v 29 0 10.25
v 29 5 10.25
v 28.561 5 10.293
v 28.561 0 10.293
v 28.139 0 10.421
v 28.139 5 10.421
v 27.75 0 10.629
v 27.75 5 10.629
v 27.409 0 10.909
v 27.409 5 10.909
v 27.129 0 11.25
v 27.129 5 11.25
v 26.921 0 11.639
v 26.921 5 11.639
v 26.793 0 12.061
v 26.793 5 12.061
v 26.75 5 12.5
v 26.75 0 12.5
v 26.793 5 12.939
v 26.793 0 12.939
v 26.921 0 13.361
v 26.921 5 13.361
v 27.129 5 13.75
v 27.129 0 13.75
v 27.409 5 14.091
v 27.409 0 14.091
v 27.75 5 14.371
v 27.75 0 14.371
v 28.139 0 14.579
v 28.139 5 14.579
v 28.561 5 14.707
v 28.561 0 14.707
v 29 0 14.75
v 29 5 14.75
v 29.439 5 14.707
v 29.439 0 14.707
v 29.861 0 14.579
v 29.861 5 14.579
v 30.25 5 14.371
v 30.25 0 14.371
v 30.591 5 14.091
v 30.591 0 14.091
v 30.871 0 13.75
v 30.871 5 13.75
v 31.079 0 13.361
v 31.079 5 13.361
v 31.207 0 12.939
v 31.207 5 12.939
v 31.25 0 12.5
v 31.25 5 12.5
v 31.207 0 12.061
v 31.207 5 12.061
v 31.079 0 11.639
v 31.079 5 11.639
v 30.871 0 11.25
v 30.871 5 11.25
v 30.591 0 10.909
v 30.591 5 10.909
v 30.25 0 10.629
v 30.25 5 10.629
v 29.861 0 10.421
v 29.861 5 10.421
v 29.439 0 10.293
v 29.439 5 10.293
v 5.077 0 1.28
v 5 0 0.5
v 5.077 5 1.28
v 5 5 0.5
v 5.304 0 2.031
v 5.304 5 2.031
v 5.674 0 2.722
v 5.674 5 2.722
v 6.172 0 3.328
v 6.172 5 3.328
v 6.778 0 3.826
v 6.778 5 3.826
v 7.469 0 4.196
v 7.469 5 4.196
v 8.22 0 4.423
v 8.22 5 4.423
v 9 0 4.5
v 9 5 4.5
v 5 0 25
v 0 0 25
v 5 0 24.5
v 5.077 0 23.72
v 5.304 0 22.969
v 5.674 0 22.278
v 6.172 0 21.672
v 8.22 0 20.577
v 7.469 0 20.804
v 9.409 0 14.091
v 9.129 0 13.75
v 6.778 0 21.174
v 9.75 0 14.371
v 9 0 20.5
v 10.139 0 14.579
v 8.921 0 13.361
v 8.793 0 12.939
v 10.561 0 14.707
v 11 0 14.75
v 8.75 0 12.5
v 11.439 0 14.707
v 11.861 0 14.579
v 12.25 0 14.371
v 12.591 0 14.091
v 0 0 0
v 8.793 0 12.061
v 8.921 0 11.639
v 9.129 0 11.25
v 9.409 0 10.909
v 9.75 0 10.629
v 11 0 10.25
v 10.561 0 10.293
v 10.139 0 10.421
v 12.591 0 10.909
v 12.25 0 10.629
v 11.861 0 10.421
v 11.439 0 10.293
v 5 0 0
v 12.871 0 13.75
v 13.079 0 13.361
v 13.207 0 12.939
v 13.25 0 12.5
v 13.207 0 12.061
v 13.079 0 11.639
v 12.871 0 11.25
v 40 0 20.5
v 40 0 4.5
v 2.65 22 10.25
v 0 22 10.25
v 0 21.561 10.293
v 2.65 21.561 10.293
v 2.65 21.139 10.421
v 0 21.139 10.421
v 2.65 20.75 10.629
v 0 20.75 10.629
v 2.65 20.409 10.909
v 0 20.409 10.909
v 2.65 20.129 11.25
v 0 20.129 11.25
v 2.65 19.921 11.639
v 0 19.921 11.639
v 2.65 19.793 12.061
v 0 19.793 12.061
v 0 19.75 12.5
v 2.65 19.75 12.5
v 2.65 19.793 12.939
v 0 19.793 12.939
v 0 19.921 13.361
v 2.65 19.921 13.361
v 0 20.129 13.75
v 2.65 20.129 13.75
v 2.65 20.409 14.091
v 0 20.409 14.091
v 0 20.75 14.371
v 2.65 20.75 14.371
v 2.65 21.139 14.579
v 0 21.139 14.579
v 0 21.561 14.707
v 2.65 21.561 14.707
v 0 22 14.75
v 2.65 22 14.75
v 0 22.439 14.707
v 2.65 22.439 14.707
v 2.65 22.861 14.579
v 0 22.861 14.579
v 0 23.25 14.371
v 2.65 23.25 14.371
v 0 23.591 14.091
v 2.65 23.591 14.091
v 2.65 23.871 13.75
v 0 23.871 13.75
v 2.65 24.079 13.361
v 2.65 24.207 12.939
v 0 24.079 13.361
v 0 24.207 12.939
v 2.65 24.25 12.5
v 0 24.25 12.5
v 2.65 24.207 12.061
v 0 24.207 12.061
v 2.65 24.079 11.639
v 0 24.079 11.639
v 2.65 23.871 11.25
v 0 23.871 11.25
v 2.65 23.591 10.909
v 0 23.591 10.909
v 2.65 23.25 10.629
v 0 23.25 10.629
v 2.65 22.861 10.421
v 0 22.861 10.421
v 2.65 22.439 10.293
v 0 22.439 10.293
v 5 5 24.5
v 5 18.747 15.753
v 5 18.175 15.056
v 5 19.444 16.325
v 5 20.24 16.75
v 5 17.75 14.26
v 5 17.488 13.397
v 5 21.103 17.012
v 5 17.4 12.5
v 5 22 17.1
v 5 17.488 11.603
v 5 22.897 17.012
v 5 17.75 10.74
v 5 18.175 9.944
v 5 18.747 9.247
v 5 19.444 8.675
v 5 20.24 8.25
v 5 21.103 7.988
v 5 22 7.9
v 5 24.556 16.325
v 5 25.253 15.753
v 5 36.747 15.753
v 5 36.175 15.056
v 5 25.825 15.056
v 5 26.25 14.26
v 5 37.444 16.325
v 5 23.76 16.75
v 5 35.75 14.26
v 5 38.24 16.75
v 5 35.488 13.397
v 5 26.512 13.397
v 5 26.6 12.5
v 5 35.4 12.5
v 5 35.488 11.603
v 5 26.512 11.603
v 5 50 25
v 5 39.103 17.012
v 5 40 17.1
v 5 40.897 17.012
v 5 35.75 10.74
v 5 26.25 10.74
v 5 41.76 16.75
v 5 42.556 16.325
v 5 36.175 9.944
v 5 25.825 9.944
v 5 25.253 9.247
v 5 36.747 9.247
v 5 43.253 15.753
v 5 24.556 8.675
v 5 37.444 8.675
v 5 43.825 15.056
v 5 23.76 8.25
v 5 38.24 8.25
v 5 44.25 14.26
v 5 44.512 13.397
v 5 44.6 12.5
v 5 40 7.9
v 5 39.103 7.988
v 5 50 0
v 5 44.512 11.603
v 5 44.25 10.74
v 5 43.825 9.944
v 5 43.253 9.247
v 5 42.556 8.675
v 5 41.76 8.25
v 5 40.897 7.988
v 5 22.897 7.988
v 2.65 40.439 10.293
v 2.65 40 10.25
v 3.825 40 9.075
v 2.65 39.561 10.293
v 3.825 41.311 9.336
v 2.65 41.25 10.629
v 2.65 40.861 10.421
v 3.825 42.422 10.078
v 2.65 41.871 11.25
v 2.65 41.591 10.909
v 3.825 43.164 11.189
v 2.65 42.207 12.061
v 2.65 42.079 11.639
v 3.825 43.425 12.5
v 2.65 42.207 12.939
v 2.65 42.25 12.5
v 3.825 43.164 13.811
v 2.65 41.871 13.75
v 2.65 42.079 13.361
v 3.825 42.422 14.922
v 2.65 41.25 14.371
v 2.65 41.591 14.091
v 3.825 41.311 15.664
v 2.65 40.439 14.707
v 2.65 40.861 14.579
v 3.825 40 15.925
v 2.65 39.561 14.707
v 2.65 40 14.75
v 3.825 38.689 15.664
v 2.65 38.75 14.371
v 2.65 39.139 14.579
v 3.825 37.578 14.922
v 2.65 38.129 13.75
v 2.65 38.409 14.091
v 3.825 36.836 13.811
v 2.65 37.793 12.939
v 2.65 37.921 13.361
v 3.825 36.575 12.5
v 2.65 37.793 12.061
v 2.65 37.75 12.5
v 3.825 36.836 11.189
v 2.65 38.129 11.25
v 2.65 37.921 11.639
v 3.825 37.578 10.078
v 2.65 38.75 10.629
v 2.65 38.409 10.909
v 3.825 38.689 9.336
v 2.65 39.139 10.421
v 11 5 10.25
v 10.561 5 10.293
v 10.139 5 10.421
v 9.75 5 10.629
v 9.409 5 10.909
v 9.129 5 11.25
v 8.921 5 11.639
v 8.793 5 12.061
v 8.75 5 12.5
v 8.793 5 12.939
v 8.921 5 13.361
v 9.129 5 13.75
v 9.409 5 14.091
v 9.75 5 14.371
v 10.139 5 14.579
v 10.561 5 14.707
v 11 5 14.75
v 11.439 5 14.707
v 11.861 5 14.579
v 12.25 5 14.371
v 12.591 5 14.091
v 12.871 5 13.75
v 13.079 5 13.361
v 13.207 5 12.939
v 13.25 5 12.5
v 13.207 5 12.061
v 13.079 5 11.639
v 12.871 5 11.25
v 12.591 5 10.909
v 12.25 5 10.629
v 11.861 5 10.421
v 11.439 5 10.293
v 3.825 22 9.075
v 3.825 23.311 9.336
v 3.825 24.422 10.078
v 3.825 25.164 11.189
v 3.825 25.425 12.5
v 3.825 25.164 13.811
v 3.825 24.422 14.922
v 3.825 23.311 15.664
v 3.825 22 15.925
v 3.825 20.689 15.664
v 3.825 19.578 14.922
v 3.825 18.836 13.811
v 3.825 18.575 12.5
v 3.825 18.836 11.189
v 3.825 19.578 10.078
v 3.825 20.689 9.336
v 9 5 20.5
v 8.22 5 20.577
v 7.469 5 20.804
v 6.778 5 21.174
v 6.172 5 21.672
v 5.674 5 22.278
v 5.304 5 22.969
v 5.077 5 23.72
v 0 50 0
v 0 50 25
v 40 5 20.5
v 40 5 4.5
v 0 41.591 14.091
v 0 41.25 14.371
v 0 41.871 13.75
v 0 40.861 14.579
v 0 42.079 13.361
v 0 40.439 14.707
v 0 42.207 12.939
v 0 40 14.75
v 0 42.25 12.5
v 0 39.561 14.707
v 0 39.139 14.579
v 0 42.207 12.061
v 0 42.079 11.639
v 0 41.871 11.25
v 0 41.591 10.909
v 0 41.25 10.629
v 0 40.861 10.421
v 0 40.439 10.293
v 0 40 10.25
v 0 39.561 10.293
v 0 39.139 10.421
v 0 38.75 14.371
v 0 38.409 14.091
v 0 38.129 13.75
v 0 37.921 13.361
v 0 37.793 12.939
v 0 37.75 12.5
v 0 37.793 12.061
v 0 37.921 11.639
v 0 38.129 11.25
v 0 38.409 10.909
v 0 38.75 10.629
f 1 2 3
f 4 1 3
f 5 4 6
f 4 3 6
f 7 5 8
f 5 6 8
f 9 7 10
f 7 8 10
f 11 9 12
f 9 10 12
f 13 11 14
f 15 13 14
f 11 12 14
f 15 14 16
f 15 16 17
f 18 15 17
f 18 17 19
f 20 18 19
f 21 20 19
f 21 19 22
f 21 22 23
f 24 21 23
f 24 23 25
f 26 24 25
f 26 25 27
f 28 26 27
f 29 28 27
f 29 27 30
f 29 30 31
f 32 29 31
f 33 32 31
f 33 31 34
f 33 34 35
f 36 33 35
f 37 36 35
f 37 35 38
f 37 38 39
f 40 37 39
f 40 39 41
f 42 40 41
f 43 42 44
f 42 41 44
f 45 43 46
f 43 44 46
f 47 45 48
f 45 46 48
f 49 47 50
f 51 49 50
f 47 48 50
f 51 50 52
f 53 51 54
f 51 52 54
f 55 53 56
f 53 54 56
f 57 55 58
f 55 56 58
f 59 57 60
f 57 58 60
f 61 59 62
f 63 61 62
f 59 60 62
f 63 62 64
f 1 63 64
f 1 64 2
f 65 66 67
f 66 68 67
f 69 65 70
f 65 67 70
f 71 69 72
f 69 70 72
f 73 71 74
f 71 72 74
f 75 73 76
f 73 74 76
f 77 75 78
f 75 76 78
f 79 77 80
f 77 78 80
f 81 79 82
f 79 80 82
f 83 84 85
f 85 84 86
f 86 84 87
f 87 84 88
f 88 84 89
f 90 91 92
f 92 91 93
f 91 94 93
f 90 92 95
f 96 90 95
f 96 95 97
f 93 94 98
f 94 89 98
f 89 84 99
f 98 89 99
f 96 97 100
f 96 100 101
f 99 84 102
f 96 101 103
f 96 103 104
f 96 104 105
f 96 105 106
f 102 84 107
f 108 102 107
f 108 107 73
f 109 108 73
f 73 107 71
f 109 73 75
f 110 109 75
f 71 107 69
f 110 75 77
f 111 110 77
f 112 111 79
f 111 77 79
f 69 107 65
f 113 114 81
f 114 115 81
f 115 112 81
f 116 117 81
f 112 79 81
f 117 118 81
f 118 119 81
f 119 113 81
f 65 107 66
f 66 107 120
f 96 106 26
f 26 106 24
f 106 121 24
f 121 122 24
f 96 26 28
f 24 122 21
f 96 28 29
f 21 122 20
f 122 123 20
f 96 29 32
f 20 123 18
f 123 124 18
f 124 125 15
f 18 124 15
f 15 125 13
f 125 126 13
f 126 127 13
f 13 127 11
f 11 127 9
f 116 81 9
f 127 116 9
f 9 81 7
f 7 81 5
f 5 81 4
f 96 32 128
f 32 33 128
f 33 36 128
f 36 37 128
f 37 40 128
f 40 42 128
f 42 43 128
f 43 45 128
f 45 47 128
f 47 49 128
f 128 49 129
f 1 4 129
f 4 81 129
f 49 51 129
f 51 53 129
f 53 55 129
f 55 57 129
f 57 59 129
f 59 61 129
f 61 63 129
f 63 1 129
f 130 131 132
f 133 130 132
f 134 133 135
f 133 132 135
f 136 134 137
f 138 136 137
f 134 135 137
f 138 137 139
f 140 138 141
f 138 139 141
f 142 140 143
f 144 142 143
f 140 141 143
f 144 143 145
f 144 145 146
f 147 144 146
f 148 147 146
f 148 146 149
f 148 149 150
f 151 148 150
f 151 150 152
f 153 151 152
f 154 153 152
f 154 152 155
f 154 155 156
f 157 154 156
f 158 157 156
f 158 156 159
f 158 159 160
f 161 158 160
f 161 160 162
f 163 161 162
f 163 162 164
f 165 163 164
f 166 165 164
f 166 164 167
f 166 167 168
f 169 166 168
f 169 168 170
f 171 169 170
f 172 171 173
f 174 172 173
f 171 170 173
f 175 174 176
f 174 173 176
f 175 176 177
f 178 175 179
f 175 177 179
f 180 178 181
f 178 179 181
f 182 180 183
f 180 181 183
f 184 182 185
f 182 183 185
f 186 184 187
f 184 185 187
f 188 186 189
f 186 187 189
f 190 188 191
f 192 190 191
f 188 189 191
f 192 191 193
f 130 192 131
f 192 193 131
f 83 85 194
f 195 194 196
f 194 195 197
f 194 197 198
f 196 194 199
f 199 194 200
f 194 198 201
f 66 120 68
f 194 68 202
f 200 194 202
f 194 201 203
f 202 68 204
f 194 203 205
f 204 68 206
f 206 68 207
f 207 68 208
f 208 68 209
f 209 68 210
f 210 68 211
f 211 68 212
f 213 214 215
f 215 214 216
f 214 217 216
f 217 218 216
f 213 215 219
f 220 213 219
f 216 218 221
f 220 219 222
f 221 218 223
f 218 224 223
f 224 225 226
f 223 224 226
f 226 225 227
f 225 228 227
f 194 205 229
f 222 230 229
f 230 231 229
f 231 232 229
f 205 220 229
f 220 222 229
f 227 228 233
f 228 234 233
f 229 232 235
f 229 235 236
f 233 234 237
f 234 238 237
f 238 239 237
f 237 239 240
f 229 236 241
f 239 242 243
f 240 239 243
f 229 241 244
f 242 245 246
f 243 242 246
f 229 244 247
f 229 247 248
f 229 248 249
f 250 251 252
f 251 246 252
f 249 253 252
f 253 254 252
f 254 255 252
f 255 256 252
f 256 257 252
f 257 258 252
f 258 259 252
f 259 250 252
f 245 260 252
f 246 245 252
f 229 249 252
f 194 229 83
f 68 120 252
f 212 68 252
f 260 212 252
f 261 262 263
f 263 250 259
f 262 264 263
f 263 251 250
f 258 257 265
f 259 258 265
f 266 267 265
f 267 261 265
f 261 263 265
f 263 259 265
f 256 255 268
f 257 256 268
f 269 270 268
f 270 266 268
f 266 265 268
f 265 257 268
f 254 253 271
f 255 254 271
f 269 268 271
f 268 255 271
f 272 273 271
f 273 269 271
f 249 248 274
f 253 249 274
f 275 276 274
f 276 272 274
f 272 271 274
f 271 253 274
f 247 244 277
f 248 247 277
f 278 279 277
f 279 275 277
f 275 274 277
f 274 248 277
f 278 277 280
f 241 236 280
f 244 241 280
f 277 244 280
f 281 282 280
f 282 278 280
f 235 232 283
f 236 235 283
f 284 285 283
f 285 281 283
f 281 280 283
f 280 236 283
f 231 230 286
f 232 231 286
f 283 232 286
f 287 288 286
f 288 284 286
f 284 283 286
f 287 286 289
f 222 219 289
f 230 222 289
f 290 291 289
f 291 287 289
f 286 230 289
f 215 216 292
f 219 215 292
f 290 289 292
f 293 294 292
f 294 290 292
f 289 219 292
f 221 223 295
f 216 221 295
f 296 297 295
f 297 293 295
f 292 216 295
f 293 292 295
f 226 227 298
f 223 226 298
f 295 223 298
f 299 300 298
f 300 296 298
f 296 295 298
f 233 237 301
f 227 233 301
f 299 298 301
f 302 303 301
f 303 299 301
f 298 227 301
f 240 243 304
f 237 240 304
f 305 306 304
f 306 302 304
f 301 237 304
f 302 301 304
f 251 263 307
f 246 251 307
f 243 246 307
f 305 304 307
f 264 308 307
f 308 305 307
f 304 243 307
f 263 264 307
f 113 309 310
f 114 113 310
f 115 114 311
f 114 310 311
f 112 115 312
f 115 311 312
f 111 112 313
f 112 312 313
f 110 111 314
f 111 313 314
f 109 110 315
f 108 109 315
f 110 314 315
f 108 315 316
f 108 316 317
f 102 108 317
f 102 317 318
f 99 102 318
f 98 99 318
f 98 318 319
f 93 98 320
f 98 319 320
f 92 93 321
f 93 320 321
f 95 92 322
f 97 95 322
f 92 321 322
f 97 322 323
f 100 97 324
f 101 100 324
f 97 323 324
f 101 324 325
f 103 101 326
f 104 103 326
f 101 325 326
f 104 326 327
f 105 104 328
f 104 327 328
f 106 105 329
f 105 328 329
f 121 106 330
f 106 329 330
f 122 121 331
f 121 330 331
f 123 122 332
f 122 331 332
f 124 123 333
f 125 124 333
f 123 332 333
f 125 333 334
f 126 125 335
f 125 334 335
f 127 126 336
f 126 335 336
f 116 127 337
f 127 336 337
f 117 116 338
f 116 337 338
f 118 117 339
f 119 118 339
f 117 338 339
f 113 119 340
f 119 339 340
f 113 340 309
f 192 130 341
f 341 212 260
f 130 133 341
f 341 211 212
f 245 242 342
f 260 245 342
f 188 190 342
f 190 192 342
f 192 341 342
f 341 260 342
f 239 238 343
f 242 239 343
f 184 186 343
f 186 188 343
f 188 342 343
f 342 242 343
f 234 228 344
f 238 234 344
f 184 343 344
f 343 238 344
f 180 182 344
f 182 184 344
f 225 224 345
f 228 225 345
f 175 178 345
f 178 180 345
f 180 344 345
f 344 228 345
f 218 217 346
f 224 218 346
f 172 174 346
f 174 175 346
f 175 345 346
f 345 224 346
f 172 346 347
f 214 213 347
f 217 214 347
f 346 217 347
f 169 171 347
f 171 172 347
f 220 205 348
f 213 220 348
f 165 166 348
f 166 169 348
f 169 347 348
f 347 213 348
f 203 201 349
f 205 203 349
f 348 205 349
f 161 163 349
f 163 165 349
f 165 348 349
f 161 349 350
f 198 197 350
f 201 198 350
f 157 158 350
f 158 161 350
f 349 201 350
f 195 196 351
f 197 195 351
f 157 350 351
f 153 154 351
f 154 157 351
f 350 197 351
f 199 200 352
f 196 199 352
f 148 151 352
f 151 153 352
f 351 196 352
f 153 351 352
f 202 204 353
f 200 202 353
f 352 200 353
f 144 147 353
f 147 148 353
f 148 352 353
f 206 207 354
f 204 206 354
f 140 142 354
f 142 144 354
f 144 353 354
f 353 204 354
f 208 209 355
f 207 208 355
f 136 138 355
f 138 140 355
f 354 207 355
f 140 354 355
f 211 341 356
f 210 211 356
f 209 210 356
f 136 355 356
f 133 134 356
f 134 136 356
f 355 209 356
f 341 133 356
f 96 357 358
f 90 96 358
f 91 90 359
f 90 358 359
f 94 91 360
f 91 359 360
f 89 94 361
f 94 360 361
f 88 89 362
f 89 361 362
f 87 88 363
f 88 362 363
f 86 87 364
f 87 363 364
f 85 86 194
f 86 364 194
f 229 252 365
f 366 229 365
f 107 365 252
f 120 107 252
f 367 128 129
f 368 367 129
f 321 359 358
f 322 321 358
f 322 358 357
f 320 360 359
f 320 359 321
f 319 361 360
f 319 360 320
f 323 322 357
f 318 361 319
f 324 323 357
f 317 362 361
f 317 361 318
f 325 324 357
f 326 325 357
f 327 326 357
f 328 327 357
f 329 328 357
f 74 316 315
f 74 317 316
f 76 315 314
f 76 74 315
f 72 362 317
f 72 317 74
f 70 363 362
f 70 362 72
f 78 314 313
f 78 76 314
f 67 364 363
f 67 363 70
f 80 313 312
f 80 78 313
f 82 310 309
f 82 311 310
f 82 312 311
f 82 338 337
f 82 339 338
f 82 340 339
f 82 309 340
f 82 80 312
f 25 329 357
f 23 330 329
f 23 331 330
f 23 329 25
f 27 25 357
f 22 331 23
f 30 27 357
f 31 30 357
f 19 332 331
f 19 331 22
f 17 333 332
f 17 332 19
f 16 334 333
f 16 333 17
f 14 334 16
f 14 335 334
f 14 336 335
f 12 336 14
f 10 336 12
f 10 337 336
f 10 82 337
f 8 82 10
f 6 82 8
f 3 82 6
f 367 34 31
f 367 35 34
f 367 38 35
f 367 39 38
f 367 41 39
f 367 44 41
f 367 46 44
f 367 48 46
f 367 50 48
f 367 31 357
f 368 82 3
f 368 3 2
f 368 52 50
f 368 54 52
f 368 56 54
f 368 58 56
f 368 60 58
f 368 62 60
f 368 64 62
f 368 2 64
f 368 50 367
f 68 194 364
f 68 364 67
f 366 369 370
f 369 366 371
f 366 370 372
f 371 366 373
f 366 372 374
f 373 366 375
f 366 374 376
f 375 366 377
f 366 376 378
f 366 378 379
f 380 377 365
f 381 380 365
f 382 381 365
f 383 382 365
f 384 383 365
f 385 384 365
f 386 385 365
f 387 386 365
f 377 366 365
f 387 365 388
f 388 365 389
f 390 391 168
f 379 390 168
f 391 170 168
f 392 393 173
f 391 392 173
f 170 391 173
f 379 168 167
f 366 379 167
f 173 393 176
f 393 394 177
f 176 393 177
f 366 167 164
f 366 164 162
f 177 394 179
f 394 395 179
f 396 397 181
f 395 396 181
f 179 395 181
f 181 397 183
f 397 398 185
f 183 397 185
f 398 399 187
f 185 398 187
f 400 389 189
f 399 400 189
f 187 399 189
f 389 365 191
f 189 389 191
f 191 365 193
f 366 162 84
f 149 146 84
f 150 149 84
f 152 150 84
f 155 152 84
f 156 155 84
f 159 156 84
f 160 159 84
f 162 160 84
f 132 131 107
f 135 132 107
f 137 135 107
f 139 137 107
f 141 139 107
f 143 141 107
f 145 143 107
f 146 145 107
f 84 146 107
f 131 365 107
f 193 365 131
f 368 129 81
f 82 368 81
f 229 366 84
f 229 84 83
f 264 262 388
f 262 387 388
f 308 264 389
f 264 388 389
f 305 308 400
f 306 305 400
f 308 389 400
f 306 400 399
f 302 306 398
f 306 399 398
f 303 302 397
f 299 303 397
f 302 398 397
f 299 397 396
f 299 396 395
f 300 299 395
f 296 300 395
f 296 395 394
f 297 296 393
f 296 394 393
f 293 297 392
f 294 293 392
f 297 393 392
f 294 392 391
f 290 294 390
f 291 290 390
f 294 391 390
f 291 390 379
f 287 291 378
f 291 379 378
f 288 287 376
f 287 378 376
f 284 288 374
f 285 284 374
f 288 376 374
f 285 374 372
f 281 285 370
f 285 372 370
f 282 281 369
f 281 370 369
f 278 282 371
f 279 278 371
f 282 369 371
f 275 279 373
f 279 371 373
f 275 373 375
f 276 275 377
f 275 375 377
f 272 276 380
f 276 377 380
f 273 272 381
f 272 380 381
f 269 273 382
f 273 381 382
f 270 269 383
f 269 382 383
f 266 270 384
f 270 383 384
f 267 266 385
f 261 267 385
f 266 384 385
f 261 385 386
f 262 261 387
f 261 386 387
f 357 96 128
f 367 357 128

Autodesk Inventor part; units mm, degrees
ref_plane "YZ Plane" through (0, 0, 0) normal (1, 0, 0) x (0, 1, 0)
ref_plane "XZ Plane" through (0, 0, 0) normal (0, 1, 0) x (-1, 0, 0)
ref_plane "XY Plane" through (0, 0, 0) normal (0, 0, 1) x (1, 0, 0)
sketch "Skizze1" plane through (0, 0, 0) normal (0, 0, 1) x (1, 0, 0)
  line L0 (5, 5) -> (5, 50)
  line L1 (5, 50) -> (0, 50)
  line L2 (0, 50) -> (0, 0)
  line L3 (5, 5) -> (50, 5)
  line L4 (50, 5) -> (50, 0)
  line L5 (-10, 0) -> (60, 0) projected
  line L6 (0, -10) -> (0, 60) projected
  line L7 (0, 0) -> (50, 0)
  dimension "d3" = 5
  dimension "d4" = 5
  dimension "d5" = 50
  dimension "d6" = 50
extrude "Extrusion1" add sketch "Skizze1" along normal blind 25
sketch "Skizze3" plane through (0, 0, 0) normal (0, -1, 0) x (1, 0, 0)
  line L0 (0, 0) -> (0, 25) projected
  line L1 (50, 0) -> (0, 0) projected
  line L2 (50, 0) -> (50, 25) projected
  line L3 (50, 25) -> (40, 25)
  line L4 (40, 25) -> (40, 0)
  line L5 (40, 0) -> (50, 0)
  line L6 (50, 0) -> (50, 25)
  dimension "d9" = 40
extrude "Extrusion2" cut sketch "Skizze3" against normal through all
sketch "Skizze4" plane through (0, 0, 0) normal (0, -1, 0) x (1, 0, 0)
  line L0 (40, 0) -> (40, 25) projected
  line L1 (40, 25) -> (0, 25) projected
  line L2 (0, 0) -> (0, 25) projected
  line L3 (5, 0) -> (5, 25) projected
  line L4 (40, 25) -> (5, 25)
  line L5 (5, 25) -> (5, 20.5)
  line L6 (5, 20.5) -> (40, 20.5)
  line L7 (40, 20.5) -> (40, 25)
  line L8 (5, 0) -> (40, 0)
  line L9 (40, 0) -> (40, 4.5)
  line L10 (40, 4.5) -> (5, 4.5)
  line L11 (5, 4.5) -> (5, 0)
  line L12 (0, 12.5) -> (40, 12.5)
  dimension "d12" = 16
extrude "Extrusion3" cut sketch "Skizze4" against normal through all contours L8 L3 L10 L0 | L6 L3 L1 L0
sketch "Skizze5" plane through (0, 0, 0) normal (0, -1, 0) x (1, 0, 0)
  line L0 (40, 4.5) -> (40, 20.5) projected
  line L1 (0, 0) -> (0, 25) projected
  line L2 (0, 12.5) -> (40, 12.5)
  point P0 (11, 12.5)
  point P1 (29, 12.5)
  dimension "d15" = 18
  dimension "d16" = 11
hole "Bohrung1" at (11, 0, 12.5) at (29, 0, 12.5) direction (0, 1, 0) diameter 4.5 end through all
fillet "Rundung1" radius 4 2 edges at (5, 2.5, 20.5) (5, 2.5, 4.5)
sketch "Skizze6" plane through (5, 0, 0) normal (1, 0, 0) x (0, 0, -1)
  line L0 (0, 50) -> (-25, 50) projected
  line L1 (-0.5, 5) -> (-24.5, 5) projected
  line L2 (-12.5, 50) -> (-12.5, 10.6492)
  point P0 (-12.5, 40)
  point P1 (-12.5, 22)
  dimension "d25" = 10
  dimension "d26" = 18
hole "Bohrung2" at (5, 40, 12.5) at (5, 22, 12.5) direction (-1, 0, 0) diameter 4.5 end through all countersink diameter 9.2 countersink angle 90
properties part number "13_0204_014"
